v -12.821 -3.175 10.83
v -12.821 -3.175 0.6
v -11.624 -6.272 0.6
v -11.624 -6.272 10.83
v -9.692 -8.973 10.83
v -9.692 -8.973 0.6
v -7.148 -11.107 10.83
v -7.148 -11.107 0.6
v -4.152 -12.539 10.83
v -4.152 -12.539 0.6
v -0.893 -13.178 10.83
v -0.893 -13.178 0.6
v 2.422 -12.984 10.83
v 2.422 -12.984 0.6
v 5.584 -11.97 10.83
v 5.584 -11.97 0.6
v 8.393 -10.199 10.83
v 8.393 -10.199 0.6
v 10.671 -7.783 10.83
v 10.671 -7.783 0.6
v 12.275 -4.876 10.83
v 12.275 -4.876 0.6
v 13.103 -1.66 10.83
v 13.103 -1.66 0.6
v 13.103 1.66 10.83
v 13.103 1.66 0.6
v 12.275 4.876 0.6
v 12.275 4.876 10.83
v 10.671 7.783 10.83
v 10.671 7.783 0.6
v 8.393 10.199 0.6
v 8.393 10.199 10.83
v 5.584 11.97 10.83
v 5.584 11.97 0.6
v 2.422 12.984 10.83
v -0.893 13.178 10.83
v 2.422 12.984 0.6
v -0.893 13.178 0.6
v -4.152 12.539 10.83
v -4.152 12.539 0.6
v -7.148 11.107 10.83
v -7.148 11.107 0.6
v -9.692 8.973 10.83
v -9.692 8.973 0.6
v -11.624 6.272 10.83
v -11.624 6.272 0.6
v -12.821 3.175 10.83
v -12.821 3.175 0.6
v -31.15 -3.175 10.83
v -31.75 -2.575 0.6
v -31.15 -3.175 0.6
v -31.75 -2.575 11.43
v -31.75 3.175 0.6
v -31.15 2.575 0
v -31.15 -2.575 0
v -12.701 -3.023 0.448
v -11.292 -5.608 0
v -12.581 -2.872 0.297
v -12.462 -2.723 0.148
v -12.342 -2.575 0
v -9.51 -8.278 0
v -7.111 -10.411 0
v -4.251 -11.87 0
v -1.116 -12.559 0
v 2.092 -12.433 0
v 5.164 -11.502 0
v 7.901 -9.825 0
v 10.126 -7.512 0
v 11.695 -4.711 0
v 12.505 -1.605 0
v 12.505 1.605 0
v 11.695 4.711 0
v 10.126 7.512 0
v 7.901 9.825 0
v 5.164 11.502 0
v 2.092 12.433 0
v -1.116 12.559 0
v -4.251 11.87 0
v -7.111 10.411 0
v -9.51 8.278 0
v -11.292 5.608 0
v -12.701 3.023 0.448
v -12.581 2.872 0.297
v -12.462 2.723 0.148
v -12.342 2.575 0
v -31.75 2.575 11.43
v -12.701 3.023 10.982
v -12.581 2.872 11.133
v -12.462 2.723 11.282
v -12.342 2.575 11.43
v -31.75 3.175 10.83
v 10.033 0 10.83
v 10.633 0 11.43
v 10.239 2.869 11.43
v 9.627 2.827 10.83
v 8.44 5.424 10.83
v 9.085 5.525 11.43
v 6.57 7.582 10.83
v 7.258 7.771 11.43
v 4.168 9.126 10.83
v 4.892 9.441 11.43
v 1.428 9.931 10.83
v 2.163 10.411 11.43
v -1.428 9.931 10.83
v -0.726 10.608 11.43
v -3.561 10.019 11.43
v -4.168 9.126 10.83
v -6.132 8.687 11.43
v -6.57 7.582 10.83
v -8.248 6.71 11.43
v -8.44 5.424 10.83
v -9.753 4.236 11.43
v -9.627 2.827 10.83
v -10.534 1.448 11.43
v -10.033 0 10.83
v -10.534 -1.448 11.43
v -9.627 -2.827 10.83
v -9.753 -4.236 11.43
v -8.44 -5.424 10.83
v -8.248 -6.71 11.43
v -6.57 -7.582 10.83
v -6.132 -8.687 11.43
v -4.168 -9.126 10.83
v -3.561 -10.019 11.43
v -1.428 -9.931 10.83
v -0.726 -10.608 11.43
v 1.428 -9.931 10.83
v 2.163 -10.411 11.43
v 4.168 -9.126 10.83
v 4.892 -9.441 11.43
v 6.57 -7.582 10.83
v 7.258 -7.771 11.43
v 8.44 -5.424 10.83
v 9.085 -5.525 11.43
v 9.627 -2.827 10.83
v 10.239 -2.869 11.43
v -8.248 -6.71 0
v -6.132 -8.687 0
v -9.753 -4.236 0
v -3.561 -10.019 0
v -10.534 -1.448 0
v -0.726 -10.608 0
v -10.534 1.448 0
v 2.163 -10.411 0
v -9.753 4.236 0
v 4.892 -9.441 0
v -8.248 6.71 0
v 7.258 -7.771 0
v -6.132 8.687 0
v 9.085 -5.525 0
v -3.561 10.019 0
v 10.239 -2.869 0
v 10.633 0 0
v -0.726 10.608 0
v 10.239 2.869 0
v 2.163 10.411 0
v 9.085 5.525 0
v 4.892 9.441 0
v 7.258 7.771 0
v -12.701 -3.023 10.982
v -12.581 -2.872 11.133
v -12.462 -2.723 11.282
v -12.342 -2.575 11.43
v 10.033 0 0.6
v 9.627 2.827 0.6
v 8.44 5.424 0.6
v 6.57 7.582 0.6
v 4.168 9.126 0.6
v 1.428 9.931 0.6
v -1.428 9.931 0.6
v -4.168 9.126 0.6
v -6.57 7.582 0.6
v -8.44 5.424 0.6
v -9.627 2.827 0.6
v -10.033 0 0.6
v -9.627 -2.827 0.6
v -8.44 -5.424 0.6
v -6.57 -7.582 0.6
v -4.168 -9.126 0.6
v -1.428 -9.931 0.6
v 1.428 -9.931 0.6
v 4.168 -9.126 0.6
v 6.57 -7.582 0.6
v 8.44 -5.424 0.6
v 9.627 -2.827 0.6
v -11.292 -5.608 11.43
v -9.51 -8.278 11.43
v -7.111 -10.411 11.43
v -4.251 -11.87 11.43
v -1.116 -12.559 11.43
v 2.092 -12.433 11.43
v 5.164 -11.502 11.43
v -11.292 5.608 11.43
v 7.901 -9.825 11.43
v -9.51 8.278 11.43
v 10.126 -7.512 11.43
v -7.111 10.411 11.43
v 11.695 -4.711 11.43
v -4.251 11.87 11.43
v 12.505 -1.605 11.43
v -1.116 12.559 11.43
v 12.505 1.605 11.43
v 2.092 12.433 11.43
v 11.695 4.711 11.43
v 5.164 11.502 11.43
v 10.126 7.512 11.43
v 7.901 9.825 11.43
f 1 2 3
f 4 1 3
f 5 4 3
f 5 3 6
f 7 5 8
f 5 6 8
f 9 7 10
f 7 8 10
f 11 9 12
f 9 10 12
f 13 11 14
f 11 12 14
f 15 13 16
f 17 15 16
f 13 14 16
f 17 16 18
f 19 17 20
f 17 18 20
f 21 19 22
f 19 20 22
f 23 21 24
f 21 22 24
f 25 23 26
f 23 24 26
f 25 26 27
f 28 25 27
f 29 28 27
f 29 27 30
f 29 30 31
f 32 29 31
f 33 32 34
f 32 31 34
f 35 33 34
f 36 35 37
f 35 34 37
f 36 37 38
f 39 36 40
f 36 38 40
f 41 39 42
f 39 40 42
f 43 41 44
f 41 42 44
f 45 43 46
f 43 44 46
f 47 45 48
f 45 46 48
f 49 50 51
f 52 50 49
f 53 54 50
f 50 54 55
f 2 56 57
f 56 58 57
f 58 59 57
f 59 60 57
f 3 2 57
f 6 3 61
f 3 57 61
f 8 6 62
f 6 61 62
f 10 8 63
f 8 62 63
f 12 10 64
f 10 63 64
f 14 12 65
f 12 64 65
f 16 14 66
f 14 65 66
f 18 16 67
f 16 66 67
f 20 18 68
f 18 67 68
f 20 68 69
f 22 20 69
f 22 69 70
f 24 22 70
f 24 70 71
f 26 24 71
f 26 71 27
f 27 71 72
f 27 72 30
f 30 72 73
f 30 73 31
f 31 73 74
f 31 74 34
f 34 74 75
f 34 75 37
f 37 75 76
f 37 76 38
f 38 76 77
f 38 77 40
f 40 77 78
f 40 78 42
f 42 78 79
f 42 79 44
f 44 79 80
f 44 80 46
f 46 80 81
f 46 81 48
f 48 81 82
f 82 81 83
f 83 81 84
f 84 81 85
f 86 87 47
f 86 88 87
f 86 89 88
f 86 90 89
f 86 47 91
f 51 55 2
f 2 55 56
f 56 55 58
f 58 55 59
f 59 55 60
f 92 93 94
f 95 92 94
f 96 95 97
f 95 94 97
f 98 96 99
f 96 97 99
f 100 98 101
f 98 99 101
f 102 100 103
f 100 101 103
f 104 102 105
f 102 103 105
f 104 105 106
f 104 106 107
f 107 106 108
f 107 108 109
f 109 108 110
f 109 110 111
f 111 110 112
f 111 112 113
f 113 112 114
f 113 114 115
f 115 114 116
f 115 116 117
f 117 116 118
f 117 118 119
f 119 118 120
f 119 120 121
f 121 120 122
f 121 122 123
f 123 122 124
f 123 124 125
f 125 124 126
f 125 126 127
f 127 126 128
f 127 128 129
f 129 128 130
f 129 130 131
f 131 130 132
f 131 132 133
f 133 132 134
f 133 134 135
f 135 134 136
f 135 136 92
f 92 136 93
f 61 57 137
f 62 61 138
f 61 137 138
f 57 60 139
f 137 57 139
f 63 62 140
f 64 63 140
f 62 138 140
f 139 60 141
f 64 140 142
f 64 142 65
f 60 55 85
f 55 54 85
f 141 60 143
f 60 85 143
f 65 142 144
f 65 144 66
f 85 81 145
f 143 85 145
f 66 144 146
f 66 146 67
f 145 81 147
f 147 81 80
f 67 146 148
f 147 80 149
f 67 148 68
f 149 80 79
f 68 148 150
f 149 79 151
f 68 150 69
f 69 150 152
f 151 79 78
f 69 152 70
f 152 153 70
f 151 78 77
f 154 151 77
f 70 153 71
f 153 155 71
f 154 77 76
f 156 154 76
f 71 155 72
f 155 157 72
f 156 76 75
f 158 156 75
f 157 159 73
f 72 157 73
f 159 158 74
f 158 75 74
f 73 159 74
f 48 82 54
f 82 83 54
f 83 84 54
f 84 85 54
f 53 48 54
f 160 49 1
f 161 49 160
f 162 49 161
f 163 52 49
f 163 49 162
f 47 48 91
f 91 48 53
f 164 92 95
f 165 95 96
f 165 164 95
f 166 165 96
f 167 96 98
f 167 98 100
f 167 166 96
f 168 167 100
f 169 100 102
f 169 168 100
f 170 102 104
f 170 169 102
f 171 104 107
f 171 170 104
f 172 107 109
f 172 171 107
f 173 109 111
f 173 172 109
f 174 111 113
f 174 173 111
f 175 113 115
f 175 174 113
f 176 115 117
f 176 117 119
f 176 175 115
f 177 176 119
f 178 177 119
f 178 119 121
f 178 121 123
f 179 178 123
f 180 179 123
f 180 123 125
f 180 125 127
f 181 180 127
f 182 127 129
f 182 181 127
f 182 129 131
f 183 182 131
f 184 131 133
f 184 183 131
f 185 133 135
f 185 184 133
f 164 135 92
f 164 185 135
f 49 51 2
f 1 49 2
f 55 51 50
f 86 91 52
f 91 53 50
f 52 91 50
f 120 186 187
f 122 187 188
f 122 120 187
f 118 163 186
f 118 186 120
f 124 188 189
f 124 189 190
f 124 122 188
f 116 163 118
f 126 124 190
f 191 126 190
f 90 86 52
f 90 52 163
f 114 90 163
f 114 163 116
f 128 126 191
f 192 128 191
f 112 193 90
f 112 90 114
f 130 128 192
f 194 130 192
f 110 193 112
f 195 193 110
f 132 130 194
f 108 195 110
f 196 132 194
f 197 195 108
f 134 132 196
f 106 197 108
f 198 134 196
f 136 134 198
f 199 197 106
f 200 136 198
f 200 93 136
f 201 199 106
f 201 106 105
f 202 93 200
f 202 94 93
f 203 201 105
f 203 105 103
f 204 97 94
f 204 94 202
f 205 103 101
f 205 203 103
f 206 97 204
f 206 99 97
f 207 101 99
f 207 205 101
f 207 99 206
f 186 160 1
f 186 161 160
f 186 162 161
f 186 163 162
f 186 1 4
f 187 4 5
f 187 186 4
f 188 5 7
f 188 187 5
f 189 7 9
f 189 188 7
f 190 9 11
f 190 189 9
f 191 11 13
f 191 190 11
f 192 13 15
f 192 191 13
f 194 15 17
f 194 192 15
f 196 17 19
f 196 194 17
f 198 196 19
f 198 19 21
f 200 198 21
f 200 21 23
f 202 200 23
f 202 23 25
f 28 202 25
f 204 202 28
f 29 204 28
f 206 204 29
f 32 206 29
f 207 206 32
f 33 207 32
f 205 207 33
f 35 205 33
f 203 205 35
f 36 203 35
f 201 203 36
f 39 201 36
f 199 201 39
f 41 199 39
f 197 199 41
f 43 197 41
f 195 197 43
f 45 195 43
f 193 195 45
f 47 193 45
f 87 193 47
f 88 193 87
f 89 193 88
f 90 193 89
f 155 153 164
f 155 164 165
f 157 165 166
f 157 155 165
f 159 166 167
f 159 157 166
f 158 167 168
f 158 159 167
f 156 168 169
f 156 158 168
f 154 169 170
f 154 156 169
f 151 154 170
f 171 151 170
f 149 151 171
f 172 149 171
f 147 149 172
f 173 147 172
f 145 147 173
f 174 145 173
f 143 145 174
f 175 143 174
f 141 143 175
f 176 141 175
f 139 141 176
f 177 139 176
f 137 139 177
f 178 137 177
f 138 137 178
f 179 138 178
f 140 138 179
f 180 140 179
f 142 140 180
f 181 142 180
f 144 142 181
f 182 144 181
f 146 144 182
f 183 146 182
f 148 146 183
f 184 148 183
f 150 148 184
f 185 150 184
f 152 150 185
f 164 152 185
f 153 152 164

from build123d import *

# Parameters (mm, degrees)
F0_R     = 10.033
F1_DEPTH = 11.43
F2_SIZE  = 0.6


with BuildPart() as f1:
    # F0 (on Top) → F1 (new body)
    with BuildSketch(Plane.XY):
        with BuildLine():
            Line((-31.75, -3.175), (-12.820711, -3.175))
            ThreePointArc((-12.820711, -3.175), (13.208, 0), (-12.820711, 3.175))
            Line((-12.820711, 3.175), (-31.75, 3.175))
            Line((-31.75, 3.175), (-31.75, -3.175))
        make_face()
        Circle(F0_R, mode=Mode.SUBTRACT)
    extrude(amount=F1_DEPTH)

    # F2
    f2_edges = [f1.edges().sort_by_distance(p)[0] for p in [
        (-10.033, 0, 11.43),
        (13.208, 0, 11.43),
        (-22.285356, -3.175, 11.43),
        (-22.285356, 3.175, 11.43),
        (-22.285356, -3.175, 0),
        (-31.75, -3.175, 5.715),
        (13.208, 0, 0),
        (-10.033, 0, 0),
        (-22.285356, 3.175, 0),
        (-31.75, 0, 0),
    ]]
    chamfer(f2_edges, length=F2_SIZE)


solid = f1.part
